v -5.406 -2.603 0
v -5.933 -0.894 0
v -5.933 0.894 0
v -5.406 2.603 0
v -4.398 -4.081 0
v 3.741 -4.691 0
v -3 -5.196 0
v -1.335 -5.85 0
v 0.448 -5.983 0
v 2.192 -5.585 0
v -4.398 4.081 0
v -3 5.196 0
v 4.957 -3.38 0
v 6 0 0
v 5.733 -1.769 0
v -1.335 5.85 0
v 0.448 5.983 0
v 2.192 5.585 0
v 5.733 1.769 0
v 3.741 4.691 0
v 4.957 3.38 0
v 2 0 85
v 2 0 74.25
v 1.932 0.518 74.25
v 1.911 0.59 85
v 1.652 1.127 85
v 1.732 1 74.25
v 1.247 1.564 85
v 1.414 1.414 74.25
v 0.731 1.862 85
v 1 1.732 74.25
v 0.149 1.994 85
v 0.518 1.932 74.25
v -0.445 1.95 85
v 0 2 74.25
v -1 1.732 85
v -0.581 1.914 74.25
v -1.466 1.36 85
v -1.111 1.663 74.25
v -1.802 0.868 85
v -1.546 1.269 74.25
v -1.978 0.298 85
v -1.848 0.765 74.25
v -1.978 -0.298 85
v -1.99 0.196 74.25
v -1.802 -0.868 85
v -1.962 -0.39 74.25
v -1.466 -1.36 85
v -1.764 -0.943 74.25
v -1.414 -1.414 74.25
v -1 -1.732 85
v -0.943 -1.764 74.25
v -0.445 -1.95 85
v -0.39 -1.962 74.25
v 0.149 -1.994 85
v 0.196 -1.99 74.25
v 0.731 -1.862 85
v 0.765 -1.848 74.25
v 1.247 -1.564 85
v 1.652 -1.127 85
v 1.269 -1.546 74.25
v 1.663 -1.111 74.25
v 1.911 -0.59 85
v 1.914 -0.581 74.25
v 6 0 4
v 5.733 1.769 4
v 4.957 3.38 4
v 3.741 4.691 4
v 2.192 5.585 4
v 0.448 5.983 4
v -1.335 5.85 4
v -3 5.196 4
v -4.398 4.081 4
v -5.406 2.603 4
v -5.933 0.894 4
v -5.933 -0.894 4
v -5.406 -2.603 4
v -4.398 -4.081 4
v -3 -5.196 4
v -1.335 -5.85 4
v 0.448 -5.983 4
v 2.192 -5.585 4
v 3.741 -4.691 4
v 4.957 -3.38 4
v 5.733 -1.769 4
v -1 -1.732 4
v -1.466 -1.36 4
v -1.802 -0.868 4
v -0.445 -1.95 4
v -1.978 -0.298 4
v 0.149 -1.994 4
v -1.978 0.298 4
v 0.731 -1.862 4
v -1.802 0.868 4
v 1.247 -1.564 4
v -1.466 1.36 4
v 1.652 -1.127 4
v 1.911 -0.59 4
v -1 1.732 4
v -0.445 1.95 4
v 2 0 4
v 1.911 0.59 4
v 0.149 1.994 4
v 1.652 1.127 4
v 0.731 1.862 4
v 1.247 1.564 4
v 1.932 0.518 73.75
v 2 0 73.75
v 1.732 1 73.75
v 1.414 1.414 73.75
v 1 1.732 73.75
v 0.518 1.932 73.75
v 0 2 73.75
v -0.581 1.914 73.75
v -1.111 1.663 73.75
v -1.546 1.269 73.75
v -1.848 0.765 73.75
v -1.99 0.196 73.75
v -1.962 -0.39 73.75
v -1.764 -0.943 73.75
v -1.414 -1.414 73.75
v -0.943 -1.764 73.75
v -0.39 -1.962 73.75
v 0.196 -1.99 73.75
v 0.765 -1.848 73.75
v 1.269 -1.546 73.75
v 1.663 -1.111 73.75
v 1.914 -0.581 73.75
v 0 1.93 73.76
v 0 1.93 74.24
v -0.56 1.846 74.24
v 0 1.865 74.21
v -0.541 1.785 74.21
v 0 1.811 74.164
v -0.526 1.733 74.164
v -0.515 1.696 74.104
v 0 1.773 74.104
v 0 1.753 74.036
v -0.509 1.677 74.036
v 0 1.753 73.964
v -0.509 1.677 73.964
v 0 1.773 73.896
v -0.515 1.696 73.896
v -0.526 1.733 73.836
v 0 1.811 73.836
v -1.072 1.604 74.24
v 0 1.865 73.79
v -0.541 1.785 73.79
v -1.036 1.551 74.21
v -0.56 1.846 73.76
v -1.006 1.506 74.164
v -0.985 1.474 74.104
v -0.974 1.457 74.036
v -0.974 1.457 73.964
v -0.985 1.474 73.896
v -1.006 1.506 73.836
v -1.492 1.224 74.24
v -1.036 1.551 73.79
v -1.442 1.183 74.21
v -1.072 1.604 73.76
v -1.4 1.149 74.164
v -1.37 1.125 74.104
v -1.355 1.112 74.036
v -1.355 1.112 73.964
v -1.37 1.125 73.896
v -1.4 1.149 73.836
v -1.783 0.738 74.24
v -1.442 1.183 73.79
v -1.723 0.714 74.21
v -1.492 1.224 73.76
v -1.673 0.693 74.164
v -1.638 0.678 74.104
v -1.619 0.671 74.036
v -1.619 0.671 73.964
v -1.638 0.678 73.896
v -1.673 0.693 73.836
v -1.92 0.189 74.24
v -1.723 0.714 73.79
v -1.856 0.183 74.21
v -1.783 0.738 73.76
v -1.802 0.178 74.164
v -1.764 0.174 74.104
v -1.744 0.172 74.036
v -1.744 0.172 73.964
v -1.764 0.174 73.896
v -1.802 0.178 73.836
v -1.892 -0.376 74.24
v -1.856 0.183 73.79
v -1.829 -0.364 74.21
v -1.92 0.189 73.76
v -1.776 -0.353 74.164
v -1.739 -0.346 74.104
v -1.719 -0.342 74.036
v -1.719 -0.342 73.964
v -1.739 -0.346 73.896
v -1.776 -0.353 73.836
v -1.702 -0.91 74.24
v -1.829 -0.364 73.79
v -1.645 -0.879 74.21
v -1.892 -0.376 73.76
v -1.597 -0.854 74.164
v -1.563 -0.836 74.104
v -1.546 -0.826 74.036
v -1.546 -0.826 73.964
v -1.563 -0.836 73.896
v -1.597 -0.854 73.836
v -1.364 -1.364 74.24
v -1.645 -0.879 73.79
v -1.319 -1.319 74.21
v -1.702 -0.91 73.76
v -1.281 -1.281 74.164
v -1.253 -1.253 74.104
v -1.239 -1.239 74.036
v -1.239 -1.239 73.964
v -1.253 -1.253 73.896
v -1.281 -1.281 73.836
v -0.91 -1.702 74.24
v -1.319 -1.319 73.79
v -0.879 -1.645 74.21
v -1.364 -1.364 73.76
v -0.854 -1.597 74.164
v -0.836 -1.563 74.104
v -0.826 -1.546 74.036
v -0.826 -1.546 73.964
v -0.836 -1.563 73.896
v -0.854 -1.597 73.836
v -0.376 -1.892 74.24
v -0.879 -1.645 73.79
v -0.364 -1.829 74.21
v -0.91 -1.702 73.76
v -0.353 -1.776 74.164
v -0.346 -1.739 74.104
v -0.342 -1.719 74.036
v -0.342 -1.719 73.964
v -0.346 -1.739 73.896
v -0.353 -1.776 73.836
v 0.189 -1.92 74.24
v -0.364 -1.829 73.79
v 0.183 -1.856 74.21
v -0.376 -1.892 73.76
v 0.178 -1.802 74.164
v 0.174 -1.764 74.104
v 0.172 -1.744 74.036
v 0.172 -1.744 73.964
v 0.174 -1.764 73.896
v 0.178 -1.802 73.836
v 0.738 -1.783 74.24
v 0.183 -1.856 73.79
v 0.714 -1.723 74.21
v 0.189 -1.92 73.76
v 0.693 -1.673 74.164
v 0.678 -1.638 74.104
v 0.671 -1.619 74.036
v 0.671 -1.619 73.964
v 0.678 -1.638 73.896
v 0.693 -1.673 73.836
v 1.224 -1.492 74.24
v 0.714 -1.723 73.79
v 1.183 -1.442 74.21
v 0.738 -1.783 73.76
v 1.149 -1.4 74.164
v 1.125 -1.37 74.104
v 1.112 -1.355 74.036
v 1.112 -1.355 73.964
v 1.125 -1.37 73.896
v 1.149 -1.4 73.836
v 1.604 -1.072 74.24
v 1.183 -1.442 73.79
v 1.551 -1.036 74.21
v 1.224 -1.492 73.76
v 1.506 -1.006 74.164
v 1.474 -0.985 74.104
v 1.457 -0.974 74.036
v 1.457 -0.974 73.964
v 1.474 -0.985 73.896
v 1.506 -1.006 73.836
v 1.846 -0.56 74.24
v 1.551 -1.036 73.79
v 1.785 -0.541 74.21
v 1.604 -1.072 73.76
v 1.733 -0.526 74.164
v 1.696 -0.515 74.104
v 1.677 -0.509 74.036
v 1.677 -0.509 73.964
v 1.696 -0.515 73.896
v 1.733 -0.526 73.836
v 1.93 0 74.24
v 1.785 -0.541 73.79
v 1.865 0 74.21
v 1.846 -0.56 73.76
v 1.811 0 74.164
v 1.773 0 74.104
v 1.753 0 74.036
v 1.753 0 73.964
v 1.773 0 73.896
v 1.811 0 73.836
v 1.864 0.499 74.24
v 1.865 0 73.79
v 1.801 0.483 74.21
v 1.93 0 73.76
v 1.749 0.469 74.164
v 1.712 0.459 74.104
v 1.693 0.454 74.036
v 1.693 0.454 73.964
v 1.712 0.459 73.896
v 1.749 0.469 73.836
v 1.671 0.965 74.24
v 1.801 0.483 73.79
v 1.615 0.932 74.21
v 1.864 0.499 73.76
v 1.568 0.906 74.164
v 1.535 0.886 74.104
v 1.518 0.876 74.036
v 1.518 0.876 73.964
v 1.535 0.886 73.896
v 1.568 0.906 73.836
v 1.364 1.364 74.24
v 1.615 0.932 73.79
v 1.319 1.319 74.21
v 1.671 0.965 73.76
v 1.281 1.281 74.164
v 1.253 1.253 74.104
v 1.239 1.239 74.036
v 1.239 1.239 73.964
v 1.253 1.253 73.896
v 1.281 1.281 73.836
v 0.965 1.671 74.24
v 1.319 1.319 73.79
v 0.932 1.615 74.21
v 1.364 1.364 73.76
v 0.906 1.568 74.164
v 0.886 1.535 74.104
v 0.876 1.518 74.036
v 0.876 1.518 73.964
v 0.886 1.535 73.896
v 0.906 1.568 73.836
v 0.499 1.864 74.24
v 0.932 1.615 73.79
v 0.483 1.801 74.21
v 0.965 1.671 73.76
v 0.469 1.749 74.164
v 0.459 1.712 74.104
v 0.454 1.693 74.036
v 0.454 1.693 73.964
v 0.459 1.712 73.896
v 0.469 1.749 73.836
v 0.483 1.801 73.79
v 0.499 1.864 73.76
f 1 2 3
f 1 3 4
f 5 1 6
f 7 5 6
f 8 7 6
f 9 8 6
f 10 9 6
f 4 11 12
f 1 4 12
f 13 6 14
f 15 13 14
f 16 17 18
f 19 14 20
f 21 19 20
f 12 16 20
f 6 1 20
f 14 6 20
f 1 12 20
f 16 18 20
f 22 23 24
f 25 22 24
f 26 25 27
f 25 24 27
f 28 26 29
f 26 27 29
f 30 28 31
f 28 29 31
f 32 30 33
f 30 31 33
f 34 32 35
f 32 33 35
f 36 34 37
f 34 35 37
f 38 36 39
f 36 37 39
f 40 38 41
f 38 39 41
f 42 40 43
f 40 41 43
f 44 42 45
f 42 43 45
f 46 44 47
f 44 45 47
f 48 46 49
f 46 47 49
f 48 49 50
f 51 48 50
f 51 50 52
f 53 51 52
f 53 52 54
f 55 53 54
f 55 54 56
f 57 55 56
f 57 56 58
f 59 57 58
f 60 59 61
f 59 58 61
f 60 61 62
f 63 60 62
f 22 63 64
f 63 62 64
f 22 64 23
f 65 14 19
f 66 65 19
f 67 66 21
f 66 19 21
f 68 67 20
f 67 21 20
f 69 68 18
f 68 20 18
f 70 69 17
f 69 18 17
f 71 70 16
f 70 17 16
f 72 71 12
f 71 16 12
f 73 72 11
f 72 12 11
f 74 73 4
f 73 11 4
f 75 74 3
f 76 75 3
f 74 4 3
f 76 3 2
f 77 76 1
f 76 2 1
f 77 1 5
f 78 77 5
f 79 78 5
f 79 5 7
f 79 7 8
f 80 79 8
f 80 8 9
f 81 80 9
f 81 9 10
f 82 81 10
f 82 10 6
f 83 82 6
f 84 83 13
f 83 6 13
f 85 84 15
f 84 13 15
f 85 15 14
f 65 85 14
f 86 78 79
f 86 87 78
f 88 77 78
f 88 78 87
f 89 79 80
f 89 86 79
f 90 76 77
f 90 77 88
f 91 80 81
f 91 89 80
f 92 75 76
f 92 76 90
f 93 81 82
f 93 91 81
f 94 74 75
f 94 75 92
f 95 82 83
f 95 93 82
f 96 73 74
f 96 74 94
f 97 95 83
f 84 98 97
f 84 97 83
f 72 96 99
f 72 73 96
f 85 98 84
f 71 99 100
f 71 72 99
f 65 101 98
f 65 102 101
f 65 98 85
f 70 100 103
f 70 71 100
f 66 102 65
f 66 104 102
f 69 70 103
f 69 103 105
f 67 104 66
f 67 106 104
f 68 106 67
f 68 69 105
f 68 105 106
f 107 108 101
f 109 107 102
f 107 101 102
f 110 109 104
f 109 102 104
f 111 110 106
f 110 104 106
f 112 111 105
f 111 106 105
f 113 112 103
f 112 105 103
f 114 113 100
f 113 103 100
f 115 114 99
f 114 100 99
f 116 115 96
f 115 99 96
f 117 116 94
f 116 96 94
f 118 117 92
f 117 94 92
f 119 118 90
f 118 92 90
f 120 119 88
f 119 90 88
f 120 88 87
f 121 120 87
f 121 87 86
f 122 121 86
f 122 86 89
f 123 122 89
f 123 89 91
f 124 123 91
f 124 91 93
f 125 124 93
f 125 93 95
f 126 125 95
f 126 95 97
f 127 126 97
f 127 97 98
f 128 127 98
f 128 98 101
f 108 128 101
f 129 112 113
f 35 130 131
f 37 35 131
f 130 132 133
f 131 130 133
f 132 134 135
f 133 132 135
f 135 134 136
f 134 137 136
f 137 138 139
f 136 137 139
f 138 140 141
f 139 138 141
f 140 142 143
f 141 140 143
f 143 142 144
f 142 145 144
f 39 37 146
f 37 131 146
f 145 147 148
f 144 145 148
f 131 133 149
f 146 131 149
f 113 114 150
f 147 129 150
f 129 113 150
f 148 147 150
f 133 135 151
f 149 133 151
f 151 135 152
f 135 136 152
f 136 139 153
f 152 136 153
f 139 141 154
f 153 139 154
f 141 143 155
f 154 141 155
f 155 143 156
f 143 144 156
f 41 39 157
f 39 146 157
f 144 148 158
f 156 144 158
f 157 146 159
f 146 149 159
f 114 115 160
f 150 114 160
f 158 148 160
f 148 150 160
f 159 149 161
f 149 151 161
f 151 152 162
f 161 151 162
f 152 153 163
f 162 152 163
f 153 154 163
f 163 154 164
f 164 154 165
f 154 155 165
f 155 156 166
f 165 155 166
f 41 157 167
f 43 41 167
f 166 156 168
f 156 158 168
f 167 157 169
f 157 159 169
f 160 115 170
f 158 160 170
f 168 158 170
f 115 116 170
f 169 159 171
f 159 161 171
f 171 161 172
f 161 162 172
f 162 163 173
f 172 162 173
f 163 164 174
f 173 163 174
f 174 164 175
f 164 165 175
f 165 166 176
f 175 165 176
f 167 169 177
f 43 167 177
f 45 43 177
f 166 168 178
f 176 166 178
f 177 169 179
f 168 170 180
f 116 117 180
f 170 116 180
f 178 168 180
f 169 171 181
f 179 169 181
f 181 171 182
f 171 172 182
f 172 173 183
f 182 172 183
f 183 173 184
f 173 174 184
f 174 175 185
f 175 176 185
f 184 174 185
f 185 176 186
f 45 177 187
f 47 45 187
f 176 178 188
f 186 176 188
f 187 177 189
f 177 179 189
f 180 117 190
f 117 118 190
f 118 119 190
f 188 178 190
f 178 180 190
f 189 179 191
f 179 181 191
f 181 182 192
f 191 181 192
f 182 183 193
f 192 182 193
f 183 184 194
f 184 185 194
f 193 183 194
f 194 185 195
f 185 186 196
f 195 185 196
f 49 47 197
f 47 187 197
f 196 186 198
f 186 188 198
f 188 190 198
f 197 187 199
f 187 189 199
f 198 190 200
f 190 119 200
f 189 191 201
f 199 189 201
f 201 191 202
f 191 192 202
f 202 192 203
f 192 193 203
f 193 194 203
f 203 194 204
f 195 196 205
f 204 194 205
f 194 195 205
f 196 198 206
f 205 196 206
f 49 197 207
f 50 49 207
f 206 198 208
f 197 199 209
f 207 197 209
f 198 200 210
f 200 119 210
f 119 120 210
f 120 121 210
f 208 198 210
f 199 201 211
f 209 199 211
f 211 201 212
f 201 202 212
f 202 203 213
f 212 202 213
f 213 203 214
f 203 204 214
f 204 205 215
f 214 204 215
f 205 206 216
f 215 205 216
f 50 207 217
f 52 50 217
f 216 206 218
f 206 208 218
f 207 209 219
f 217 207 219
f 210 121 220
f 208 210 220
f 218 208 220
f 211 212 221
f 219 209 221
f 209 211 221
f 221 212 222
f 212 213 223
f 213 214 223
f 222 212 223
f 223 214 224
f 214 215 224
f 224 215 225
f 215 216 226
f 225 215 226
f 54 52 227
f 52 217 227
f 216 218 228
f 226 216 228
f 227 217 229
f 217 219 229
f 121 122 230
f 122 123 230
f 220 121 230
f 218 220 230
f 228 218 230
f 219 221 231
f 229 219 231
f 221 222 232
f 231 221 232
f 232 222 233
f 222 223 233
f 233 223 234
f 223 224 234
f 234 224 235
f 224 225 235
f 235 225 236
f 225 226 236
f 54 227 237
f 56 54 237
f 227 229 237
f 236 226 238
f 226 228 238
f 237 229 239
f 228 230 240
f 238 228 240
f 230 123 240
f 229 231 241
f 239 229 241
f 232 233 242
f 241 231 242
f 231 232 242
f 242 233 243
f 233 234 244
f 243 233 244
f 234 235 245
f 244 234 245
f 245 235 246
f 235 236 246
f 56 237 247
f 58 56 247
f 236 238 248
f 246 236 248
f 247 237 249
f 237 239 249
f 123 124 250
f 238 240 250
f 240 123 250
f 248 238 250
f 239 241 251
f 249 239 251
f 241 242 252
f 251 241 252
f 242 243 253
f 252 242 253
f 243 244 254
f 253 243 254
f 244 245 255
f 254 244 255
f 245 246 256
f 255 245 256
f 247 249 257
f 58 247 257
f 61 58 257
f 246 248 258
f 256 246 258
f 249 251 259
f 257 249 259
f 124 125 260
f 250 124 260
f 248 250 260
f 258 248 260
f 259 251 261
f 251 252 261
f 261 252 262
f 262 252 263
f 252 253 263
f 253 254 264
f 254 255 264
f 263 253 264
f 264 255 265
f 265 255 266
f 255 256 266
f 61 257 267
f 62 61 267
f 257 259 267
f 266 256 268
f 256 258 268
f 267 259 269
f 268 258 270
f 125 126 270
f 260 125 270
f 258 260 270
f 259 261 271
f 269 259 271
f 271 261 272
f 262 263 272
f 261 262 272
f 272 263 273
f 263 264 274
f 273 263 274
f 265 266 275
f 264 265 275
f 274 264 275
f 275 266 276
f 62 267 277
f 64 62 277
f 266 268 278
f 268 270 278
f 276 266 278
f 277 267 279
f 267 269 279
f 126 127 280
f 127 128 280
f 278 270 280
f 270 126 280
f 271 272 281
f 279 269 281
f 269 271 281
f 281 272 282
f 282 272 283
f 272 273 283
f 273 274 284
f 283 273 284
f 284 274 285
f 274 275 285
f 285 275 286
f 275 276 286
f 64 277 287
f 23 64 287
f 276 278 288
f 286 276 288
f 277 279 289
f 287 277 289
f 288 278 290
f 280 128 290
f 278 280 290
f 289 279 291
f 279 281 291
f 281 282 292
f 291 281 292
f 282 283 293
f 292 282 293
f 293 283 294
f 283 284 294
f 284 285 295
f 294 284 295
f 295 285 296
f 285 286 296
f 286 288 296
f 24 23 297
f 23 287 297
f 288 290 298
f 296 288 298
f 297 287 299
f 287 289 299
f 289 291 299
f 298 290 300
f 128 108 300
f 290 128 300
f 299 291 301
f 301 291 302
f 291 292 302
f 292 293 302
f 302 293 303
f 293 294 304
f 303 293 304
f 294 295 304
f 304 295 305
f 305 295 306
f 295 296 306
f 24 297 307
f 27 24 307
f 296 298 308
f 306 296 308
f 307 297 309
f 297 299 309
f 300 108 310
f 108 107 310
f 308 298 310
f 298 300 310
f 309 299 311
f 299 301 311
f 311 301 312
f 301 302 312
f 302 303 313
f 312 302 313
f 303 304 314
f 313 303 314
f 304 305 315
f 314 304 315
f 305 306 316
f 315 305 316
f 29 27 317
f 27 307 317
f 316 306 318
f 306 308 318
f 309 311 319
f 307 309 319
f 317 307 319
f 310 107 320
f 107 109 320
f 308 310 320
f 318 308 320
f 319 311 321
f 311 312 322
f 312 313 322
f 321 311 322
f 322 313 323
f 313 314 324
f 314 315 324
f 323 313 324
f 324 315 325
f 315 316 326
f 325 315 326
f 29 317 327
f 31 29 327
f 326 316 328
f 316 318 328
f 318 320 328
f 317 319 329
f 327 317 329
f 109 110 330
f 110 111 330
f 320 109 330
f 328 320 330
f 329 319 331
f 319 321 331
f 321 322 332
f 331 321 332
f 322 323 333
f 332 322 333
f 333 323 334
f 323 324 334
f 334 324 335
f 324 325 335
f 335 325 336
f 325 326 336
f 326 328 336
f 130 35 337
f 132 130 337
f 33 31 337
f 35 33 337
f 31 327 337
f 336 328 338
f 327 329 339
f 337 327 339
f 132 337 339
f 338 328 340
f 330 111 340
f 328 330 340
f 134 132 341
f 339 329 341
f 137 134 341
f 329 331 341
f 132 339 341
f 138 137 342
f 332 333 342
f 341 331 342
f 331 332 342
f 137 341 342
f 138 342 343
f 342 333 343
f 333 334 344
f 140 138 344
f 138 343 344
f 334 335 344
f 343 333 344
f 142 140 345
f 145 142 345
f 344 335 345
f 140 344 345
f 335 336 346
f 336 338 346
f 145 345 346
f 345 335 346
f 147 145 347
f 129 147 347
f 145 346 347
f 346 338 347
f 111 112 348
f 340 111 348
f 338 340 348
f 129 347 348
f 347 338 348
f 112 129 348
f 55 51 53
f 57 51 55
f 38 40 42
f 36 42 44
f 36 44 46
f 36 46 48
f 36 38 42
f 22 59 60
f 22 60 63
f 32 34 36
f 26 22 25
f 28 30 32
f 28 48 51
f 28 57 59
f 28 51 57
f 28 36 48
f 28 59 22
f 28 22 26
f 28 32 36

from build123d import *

# Parameters (mm, degrees)
SKETCH1_R           = 6
BOSS_EXTRUDE1_DEPTH = 4
SKETCH2_R           = 2
BOSS_EXTRUDE2_DEPTH = 85
SKETCH3_R           = 0.25


with BuildPart() as part:
    # Sketch1 → Boss-Extrude1 (new body)
    with BuildSketch(Plane.XY):
        Circle(SKETCH1_R)
    extrude(amount=BOSS_EXTRUDE1_DEPTH)

    # Sketch2 → Boss-Extrude2 (add)
    with BuildSketch(Plane.XY):
        Circle(SKETCH2_R)
    extrude(amount=BOSS_EXTRUDE2_DEPTH)

    # Sketch3 → Cut-Revolve1 (revolve, cut)
    with BuildSketch(Plane(origin=(0, 0, 0), x_dir=(0, 0, -1), z_dir=(1, 0, 0))):
        with Locations((-74, 2)):
            Circle(SKETCH3_R)
    revolve(axis=Axis((0, 0, 0), (0, 0, 1)), mode=Mode.SUBTRACT)


solid = part.part
